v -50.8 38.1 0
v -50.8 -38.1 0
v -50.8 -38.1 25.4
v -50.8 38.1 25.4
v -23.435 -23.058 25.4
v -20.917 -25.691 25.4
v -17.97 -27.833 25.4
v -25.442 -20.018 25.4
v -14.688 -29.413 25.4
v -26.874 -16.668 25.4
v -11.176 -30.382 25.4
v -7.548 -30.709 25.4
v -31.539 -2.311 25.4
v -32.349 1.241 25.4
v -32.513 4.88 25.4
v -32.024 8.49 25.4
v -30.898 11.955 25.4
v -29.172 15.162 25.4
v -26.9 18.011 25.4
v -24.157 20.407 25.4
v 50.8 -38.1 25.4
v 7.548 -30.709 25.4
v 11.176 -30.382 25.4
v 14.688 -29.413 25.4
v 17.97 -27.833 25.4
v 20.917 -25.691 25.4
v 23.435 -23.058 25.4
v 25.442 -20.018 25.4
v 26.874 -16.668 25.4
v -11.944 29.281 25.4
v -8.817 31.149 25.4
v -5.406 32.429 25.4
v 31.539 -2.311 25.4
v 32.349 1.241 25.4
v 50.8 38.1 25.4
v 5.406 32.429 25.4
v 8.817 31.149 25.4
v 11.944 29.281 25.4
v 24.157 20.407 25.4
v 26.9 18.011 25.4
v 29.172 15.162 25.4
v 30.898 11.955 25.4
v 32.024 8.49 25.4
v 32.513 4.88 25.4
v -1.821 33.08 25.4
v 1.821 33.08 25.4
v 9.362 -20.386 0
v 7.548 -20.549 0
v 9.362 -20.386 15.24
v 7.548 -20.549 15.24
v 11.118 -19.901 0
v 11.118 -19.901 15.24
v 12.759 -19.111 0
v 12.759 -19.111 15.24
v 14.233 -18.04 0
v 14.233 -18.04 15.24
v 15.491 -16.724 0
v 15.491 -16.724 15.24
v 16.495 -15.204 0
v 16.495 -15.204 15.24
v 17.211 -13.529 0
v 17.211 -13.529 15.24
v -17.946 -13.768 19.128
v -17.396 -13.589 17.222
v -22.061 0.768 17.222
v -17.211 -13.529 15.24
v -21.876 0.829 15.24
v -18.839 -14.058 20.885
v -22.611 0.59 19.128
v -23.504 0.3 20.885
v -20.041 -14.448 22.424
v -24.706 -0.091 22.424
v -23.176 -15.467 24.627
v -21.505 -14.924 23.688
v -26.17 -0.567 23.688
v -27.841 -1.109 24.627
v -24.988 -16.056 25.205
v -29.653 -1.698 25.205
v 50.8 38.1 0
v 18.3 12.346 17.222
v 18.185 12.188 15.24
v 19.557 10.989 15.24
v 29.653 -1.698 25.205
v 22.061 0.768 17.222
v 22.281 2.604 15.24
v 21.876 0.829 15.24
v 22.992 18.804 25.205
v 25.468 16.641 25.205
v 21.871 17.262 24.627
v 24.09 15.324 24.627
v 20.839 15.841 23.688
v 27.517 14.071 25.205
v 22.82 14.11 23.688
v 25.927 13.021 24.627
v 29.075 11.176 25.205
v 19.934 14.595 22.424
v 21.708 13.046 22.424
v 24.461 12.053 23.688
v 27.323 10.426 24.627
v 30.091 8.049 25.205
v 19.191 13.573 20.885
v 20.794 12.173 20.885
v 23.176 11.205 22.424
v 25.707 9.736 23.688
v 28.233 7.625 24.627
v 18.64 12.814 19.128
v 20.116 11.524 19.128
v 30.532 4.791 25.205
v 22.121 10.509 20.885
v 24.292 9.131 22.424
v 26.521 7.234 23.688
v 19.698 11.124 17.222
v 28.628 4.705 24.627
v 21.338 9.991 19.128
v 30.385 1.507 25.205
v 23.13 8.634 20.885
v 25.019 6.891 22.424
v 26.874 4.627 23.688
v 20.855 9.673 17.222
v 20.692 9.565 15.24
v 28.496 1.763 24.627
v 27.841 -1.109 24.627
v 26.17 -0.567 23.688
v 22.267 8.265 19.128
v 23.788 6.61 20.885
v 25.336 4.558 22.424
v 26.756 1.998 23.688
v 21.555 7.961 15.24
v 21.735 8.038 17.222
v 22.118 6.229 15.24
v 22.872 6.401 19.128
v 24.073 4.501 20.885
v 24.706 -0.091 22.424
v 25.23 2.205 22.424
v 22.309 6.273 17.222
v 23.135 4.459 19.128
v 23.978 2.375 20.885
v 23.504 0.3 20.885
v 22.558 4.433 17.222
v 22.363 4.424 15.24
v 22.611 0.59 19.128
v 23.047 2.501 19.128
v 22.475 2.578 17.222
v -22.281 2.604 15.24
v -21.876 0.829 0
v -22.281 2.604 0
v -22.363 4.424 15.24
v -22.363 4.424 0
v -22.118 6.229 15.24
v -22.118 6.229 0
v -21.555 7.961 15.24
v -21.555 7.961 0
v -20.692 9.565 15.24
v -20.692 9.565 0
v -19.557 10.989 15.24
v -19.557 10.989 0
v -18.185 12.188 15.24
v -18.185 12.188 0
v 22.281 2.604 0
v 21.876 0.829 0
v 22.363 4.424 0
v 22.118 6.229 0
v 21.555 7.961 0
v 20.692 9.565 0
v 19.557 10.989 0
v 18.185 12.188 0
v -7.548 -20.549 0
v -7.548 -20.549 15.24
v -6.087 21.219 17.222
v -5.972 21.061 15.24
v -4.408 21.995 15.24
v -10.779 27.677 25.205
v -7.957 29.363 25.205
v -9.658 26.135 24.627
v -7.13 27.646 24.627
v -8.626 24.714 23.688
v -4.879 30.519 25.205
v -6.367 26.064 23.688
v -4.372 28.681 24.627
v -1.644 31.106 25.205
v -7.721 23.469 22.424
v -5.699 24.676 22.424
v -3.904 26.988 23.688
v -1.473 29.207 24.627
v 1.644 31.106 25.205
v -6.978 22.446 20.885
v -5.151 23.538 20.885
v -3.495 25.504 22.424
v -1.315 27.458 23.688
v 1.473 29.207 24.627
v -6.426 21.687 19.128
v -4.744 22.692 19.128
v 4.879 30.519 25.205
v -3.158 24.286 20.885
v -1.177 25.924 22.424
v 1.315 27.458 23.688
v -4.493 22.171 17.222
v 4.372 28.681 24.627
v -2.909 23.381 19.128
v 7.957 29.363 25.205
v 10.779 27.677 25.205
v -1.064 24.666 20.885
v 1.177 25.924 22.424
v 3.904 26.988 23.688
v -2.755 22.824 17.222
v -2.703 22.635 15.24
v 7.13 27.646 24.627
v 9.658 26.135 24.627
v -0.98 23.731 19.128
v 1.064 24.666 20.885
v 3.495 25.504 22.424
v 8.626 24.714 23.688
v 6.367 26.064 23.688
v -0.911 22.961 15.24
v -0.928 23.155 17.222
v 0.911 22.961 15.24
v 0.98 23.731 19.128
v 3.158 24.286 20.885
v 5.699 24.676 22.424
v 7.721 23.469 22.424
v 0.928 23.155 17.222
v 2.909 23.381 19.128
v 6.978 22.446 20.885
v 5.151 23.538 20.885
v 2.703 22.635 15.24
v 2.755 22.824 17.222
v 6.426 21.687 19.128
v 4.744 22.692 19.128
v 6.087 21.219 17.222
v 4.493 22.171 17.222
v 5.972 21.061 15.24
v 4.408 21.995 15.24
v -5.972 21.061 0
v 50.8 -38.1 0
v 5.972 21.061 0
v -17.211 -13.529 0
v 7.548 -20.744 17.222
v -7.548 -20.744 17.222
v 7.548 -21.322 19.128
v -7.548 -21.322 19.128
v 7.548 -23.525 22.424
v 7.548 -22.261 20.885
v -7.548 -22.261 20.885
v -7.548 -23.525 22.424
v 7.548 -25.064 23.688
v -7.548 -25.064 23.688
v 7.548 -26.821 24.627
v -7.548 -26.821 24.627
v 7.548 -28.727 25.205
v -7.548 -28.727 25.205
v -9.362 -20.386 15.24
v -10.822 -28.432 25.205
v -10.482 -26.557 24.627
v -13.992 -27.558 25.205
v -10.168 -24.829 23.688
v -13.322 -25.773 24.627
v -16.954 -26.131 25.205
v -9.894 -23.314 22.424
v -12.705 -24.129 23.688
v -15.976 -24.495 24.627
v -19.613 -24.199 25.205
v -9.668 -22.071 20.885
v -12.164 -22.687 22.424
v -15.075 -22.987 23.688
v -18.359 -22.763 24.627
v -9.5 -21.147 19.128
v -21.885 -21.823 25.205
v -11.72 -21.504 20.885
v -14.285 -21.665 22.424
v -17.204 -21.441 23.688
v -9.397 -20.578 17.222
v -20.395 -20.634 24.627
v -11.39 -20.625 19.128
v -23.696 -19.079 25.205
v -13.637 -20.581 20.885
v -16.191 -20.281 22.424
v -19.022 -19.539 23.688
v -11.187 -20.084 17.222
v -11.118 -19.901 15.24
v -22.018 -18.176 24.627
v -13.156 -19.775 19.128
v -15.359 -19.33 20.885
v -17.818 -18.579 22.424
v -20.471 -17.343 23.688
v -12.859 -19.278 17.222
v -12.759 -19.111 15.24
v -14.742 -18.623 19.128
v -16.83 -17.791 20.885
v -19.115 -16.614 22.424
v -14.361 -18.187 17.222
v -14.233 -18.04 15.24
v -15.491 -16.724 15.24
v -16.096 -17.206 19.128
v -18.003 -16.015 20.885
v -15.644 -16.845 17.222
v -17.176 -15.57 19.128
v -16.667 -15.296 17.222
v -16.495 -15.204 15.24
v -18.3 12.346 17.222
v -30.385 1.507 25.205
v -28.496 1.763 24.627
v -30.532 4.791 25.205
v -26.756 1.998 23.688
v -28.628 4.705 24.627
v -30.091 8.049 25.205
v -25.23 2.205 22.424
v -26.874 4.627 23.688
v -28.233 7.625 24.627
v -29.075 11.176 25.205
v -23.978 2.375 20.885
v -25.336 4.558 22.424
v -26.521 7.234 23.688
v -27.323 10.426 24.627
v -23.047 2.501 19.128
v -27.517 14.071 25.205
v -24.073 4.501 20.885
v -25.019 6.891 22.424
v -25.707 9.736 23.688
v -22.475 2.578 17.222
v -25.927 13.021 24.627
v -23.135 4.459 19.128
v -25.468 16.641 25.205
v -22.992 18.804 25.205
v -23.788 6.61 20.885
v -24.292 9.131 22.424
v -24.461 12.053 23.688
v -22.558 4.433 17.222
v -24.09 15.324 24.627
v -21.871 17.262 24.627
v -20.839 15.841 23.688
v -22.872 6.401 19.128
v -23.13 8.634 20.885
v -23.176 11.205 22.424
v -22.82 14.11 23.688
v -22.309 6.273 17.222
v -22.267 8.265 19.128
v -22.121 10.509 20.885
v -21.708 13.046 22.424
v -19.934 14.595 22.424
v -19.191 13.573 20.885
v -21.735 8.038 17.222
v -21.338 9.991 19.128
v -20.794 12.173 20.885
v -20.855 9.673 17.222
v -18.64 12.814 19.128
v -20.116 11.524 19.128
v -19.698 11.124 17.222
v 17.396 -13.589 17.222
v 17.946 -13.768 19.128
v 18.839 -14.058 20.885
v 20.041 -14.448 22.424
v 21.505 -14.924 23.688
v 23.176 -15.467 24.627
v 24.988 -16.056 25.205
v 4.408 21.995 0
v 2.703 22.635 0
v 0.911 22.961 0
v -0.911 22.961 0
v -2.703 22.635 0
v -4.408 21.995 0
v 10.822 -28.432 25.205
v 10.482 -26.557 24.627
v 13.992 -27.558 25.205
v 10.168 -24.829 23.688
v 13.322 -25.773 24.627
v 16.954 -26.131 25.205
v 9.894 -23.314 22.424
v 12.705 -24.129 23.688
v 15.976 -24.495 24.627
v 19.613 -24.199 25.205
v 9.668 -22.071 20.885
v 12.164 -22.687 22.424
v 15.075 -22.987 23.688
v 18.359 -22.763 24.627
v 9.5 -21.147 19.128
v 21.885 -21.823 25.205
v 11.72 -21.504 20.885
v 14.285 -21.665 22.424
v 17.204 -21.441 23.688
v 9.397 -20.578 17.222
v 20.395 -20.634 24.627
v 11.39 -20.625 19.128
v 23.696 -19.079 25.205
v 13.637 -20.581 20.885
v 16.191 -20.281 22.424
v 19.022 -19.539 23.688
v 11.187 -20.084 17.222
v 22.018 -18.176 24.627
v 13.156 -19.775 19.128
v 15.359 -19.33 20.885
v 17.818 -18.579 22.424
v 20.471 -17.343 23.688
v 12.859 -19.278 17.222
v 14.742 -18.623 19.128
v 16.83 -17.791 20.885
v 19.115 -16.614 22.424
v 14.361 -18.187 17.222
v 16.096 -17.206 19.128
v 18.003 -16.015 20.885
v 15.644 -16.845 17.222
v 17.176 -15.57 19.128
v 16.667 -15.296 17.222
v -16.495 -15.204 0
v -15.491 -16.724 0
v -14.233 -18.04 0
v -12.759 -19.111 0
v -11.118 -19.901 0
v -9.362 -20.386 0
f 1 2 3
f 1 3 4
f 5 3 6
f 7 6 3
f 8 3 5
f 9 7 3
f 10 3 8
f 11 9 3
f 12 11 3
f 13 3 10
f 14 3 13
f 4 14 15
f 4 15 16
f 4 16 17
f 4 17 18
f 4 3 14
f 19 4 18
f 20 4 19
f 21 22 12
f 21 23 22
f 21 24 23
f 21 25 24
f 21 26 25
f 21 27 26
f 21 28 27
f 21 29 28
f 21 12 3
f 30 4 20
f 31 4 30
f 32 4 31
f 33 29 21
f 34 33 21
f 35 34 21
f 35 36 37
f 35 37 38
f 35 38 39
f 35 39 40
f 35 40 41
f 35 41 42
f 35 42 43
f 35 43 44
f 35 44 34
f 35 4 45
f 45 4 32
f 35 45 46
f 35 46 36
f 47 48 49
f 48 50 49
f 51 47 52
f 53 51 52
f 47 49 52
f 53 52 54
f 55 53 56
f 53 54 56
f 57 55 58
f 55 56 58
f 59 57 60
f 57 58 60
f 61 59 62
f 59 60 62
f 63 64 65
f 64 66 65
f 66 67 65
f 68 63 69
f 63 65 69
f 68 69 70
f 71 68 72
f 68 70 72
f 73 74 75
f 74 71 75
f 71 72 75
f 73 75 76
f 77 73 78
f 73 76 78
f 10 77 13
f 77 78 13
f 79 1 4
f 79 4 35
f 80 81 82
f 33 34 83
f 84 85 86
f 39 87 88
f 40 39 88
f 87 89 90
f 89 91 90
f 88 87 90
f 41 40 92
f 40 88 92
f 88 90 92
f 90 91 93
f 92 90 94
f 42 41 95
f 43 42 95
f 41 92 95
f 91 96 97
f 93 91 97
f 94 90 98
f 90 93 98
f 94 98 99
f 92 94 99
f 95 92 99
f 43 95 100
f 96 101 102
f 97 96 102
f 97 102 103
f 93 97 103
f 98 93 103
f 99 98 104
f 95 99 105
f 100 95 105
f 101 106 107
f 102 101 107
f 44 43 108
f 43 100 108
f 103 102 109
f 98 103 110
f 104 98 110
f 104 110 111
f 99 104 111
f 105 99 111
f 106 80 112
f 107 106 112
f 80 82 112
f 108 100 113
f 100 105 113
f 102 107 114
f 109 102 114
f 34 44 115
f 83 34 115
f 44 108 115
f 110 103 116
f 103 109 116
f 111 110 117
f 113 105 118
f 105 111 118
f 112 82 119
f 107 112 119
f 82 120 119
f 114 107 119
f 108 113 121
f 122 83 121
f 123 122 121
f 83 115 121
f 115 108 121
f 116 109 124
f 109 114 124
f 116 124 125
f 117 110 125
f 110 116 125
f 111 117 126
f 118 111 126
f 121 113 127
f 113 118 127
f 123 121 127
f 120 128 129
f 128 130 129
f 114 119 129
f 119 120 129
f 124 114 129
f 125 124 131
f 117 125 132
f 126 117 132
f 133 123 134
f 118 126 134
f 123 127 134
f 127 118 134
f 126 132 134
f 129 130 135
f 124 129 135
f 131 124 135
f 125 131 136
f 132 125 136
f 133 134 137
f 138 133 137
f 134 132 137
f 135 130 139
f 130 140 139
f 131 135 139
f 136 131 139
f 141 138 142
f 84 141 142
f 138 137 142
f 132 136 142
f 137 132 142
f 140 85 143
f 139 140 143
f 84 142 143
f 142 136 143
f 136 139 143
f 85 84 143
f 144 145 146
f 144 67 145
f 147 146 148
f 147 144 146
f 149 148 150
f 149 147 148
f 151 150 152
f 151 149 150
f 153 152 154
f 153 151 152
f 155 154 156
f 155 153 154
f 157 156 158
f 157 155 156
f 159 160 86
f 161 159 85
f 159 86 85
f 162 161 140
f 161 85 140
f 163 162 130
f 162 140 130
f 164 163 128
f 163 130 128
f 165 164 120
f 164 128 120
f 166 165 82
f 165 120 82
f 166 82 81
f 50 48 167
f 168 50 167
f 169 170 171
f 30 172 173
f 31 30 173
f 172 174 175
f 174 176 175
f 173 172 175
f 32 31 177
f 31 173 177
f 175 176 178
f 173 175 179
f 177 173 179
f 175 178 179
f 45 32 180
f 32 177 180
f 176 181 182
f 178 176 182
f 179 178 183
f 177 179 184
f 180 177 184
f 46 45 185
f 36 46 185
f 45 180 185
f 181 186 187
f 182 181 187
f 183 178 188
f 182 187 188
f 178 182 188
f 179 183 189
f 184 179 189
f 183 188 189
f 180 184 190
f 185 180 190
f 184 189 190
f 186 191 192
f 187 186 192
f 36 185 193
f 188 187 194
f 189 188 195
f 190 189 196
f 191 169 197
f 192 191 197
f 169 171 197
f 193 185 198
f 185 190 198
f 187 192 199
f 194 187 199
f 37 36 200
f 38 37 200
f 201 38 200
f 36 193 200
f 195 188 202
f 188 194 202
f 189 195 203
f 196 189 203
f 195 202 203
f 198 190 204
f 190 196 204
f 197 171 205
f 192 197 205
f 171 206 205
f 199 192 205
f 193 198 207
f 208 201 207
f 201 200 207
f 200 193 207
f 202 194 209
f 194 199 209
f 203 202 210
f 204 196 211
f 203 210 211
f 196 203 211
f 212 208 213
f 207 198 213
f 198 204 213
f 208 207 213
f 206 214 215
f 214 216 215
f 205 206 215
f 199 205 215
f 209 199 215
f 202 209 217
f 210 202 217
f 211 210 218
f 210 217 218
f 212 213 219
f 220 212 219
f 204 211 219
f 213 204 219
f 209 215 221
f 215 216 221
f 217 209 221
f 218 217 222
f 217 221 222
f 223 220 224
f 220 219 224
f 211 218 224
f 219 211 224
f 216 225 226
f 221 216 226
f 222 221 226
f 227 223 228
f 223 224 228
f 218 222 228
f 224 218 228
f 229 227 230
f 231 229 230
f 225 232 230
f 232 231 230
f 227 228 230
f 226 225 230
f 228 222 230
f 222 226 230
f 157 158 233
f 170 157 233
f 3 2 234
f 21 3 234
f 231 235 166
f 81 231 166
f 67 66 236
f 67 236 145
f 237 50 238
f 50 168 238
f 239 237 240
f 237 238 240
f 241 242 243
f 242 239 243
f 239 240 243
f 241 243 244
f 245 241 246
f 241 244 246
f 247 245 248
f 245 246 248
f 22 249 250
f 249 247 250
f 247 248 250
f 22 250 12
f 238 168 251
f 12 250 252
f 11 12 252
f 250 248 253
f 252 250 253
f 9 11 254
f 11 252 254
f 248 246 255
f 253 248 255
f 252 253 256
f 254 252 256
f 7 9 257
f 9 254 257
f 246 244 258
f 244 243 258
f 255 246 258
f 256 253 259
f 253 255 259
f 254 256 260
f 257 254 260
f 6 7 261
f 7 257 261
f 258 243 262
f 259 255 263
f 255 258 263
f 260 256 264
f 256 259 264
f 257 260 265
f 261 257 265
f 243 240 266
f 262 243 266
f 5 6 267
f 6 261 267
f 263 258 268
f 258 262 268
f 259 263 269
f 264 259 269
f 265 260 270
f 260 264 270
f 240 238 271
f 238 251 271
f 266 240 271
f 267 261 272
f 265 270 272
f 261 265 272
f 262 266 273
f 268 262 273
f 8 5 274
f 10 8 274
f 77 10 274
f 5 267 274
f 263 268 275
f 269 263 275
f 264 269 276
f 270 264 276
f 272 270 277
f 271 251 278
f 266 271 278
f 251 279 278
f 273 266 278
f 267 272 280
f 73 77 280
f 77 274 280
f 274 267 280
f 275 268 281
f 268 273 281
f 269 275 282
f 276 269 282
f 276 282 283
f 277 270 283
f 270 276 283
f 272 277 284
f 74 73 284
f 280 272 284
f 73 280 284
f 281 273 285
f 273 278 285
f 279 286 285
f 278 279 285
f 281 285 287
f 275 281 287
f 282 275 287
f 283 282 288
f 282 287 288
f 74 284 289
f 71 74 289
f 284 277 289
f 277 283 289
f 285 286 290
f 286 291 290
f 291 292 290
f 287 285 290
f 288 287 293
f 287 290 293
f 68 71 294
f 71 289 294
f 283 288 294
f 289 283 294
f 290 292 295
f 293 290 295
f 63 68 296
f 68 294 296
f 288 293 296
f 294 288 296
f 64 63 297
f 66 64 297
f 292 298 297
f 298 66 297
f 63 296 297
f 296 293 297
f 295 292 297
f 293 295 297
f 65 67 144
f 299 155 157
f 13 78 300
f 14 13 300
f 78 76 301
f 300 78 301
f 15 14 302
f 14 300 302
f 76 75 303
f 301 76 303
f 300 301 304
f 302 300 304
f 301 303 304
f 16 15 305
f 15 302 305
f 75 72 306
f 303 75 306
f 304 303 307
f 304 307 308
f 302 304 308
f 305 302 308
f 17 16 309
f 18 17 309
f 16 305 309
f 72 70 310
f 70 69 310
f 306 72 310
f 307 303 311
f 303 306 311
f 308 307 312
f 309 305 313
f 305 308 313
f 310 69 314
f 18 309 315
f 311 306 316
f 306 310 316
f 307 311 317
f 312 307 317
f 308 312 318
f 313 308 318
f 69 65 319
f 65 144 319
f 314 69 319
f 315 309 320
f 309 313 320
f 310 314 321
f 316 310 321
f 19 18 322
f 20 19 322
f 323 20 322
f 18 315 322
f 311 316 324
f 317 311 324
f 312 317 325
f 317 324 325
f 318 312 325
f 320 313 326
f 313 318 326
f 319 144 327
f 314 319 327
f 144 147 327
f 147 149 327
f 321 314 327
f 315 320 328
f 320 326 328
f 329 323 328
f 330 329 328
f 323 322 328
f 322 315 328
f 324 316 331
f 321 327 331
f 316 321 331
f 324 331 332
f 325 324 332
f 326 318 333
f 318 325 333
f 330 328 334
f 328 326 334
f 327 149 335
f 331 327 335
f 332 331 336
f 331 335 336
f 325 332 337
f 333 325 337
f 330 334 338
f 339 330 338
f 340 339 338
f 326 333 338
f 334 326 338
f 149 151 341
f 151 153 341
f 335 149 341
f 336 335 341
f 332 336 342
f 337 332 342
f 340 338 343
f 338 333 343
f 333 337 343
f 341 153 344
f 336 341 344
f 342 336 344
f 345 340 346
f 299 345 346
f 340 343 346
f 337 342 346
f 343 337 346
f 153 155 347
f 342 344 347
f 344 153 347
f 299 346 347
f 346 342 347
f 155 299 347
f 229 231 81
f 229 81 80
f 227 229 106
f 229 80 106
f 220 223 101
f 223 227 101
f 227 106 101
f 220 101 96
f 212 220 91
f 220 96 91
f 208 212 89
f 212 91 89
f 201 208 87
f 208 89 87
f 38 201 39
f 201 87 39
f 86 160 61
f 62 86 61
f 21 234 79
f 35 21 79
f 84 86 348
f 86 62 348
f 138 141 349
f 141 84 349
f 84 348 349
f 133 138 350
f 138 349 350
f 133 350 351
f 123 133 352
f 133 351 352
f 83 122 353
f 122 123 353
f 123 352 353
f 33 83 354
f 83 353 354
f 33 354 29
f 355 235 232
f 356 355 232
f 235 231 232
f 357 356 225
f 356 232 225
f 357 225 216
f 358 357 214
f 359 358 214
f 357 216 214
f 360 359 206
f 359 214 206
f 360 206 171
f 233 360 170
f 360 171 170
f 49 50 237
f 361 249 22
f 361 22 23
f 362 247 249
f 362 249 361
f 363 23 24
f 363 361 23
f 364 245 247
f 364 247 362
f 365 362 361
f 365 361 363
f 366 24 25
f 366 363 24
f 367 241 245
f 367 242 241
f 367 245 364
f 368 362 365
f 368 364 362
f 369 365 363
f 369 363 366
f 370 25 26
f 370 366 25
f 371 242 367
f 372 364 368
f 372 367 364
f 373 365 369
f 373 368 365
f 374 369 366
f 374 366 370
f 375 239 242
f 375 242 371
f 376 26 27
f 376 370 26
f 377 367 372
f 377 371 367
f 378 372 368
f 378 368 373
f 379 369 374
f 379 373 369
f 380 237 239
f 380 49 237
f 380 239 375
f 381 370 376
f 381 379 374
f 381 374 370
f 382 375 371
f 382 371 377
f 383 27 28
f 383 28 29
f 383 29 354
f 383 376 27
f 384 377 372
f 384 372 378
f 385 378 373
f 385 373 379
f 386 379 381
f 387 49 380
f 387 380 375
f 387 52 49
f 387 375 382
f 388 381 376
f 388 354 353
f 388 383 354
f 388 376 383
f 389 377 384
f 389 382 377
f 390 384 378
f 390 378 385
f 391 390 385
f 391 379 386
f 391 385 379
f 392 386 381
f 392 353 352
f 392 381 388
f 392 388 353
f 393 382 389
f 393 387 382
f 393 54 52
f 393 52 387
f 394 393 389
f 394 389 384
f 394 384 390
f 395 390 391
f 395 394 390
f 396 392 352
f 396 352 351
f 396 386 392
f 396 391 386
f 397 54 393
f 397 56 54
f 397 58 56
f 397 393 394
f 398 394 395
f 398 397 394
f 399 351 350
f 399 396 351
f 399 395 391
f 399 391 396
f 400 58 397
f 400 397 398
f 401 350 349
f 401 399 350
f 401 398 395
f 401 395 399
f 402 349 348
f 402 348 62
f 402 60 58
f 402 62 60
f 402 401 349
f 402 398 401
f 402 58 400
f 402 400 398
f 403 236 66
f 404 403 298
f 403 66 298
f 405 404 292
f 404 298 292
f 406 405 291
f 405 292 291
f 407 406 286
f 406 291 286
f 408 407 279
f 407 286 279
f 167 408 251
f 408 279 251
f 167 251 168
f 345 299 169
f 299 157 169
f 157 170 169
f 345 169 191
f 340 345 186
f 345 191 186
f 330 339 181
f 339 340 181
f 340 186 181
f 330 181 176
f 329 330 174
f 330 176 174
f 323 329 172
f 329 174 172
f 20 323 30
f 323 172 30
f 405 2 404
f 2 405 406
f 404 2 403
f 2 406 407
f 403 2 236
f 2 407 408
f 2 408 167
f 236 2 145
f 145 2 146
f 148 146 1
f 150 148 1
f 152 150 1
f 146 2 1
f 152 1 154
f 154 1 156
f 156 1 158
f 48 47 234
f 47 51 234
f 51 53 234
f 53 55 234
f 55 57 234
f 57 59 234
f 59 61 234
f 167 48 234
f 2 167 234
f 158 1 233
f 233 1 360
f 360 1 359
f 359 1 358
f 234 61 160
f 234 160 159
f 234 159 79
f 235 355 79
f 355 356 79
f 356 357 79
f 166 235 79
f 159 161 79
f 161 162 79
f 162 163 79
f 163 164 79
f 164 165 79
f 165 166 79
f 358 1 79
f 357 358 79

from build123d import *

# Parameters (mm, degrees)
F0_W     = 101.6
F0_H     = 76.2
F1_DEPTH = 25.4
F2_R     = 10.16


with BuildPart() as f1:
    # F0 (on Top) → F1 (new body)
    with BuildSketch(Plane.XY):
        Rectangle(F0_W, F0_H)
        Polygon((-24.156836, 7.849032), (0, 25.4), (24.156836, 7.849032), (14.929745, -20.549032), (-14.929745, -20.549032), align=None, mode=Mode.SUBTRACT)
    extrude(amount=F1_DEPTH)

    # F2
    f2_edges = [f1.edges().sort_by_distance(p)[0] for p in [
        (0, -20.549032, 25.4),
        (-19.54329, -6.35, 25.4),
        (-12.078418, 16.624516, 25.4),
        (12.078418, 16.624516, 25.4),
        (19.54329, -6.35, 25.4),
        (-14.929745, -20.549032, 12.7),
        (14.929745, -20.549032, 12.7),
        (24.156836, 7.849032, 12.7),
        (0, 25.4, 12.7),
        (-24.156836, 7.849032, 12.7),
    ]]
    fillet(f2_edges, radius=F2_R)


solid = f1.part
